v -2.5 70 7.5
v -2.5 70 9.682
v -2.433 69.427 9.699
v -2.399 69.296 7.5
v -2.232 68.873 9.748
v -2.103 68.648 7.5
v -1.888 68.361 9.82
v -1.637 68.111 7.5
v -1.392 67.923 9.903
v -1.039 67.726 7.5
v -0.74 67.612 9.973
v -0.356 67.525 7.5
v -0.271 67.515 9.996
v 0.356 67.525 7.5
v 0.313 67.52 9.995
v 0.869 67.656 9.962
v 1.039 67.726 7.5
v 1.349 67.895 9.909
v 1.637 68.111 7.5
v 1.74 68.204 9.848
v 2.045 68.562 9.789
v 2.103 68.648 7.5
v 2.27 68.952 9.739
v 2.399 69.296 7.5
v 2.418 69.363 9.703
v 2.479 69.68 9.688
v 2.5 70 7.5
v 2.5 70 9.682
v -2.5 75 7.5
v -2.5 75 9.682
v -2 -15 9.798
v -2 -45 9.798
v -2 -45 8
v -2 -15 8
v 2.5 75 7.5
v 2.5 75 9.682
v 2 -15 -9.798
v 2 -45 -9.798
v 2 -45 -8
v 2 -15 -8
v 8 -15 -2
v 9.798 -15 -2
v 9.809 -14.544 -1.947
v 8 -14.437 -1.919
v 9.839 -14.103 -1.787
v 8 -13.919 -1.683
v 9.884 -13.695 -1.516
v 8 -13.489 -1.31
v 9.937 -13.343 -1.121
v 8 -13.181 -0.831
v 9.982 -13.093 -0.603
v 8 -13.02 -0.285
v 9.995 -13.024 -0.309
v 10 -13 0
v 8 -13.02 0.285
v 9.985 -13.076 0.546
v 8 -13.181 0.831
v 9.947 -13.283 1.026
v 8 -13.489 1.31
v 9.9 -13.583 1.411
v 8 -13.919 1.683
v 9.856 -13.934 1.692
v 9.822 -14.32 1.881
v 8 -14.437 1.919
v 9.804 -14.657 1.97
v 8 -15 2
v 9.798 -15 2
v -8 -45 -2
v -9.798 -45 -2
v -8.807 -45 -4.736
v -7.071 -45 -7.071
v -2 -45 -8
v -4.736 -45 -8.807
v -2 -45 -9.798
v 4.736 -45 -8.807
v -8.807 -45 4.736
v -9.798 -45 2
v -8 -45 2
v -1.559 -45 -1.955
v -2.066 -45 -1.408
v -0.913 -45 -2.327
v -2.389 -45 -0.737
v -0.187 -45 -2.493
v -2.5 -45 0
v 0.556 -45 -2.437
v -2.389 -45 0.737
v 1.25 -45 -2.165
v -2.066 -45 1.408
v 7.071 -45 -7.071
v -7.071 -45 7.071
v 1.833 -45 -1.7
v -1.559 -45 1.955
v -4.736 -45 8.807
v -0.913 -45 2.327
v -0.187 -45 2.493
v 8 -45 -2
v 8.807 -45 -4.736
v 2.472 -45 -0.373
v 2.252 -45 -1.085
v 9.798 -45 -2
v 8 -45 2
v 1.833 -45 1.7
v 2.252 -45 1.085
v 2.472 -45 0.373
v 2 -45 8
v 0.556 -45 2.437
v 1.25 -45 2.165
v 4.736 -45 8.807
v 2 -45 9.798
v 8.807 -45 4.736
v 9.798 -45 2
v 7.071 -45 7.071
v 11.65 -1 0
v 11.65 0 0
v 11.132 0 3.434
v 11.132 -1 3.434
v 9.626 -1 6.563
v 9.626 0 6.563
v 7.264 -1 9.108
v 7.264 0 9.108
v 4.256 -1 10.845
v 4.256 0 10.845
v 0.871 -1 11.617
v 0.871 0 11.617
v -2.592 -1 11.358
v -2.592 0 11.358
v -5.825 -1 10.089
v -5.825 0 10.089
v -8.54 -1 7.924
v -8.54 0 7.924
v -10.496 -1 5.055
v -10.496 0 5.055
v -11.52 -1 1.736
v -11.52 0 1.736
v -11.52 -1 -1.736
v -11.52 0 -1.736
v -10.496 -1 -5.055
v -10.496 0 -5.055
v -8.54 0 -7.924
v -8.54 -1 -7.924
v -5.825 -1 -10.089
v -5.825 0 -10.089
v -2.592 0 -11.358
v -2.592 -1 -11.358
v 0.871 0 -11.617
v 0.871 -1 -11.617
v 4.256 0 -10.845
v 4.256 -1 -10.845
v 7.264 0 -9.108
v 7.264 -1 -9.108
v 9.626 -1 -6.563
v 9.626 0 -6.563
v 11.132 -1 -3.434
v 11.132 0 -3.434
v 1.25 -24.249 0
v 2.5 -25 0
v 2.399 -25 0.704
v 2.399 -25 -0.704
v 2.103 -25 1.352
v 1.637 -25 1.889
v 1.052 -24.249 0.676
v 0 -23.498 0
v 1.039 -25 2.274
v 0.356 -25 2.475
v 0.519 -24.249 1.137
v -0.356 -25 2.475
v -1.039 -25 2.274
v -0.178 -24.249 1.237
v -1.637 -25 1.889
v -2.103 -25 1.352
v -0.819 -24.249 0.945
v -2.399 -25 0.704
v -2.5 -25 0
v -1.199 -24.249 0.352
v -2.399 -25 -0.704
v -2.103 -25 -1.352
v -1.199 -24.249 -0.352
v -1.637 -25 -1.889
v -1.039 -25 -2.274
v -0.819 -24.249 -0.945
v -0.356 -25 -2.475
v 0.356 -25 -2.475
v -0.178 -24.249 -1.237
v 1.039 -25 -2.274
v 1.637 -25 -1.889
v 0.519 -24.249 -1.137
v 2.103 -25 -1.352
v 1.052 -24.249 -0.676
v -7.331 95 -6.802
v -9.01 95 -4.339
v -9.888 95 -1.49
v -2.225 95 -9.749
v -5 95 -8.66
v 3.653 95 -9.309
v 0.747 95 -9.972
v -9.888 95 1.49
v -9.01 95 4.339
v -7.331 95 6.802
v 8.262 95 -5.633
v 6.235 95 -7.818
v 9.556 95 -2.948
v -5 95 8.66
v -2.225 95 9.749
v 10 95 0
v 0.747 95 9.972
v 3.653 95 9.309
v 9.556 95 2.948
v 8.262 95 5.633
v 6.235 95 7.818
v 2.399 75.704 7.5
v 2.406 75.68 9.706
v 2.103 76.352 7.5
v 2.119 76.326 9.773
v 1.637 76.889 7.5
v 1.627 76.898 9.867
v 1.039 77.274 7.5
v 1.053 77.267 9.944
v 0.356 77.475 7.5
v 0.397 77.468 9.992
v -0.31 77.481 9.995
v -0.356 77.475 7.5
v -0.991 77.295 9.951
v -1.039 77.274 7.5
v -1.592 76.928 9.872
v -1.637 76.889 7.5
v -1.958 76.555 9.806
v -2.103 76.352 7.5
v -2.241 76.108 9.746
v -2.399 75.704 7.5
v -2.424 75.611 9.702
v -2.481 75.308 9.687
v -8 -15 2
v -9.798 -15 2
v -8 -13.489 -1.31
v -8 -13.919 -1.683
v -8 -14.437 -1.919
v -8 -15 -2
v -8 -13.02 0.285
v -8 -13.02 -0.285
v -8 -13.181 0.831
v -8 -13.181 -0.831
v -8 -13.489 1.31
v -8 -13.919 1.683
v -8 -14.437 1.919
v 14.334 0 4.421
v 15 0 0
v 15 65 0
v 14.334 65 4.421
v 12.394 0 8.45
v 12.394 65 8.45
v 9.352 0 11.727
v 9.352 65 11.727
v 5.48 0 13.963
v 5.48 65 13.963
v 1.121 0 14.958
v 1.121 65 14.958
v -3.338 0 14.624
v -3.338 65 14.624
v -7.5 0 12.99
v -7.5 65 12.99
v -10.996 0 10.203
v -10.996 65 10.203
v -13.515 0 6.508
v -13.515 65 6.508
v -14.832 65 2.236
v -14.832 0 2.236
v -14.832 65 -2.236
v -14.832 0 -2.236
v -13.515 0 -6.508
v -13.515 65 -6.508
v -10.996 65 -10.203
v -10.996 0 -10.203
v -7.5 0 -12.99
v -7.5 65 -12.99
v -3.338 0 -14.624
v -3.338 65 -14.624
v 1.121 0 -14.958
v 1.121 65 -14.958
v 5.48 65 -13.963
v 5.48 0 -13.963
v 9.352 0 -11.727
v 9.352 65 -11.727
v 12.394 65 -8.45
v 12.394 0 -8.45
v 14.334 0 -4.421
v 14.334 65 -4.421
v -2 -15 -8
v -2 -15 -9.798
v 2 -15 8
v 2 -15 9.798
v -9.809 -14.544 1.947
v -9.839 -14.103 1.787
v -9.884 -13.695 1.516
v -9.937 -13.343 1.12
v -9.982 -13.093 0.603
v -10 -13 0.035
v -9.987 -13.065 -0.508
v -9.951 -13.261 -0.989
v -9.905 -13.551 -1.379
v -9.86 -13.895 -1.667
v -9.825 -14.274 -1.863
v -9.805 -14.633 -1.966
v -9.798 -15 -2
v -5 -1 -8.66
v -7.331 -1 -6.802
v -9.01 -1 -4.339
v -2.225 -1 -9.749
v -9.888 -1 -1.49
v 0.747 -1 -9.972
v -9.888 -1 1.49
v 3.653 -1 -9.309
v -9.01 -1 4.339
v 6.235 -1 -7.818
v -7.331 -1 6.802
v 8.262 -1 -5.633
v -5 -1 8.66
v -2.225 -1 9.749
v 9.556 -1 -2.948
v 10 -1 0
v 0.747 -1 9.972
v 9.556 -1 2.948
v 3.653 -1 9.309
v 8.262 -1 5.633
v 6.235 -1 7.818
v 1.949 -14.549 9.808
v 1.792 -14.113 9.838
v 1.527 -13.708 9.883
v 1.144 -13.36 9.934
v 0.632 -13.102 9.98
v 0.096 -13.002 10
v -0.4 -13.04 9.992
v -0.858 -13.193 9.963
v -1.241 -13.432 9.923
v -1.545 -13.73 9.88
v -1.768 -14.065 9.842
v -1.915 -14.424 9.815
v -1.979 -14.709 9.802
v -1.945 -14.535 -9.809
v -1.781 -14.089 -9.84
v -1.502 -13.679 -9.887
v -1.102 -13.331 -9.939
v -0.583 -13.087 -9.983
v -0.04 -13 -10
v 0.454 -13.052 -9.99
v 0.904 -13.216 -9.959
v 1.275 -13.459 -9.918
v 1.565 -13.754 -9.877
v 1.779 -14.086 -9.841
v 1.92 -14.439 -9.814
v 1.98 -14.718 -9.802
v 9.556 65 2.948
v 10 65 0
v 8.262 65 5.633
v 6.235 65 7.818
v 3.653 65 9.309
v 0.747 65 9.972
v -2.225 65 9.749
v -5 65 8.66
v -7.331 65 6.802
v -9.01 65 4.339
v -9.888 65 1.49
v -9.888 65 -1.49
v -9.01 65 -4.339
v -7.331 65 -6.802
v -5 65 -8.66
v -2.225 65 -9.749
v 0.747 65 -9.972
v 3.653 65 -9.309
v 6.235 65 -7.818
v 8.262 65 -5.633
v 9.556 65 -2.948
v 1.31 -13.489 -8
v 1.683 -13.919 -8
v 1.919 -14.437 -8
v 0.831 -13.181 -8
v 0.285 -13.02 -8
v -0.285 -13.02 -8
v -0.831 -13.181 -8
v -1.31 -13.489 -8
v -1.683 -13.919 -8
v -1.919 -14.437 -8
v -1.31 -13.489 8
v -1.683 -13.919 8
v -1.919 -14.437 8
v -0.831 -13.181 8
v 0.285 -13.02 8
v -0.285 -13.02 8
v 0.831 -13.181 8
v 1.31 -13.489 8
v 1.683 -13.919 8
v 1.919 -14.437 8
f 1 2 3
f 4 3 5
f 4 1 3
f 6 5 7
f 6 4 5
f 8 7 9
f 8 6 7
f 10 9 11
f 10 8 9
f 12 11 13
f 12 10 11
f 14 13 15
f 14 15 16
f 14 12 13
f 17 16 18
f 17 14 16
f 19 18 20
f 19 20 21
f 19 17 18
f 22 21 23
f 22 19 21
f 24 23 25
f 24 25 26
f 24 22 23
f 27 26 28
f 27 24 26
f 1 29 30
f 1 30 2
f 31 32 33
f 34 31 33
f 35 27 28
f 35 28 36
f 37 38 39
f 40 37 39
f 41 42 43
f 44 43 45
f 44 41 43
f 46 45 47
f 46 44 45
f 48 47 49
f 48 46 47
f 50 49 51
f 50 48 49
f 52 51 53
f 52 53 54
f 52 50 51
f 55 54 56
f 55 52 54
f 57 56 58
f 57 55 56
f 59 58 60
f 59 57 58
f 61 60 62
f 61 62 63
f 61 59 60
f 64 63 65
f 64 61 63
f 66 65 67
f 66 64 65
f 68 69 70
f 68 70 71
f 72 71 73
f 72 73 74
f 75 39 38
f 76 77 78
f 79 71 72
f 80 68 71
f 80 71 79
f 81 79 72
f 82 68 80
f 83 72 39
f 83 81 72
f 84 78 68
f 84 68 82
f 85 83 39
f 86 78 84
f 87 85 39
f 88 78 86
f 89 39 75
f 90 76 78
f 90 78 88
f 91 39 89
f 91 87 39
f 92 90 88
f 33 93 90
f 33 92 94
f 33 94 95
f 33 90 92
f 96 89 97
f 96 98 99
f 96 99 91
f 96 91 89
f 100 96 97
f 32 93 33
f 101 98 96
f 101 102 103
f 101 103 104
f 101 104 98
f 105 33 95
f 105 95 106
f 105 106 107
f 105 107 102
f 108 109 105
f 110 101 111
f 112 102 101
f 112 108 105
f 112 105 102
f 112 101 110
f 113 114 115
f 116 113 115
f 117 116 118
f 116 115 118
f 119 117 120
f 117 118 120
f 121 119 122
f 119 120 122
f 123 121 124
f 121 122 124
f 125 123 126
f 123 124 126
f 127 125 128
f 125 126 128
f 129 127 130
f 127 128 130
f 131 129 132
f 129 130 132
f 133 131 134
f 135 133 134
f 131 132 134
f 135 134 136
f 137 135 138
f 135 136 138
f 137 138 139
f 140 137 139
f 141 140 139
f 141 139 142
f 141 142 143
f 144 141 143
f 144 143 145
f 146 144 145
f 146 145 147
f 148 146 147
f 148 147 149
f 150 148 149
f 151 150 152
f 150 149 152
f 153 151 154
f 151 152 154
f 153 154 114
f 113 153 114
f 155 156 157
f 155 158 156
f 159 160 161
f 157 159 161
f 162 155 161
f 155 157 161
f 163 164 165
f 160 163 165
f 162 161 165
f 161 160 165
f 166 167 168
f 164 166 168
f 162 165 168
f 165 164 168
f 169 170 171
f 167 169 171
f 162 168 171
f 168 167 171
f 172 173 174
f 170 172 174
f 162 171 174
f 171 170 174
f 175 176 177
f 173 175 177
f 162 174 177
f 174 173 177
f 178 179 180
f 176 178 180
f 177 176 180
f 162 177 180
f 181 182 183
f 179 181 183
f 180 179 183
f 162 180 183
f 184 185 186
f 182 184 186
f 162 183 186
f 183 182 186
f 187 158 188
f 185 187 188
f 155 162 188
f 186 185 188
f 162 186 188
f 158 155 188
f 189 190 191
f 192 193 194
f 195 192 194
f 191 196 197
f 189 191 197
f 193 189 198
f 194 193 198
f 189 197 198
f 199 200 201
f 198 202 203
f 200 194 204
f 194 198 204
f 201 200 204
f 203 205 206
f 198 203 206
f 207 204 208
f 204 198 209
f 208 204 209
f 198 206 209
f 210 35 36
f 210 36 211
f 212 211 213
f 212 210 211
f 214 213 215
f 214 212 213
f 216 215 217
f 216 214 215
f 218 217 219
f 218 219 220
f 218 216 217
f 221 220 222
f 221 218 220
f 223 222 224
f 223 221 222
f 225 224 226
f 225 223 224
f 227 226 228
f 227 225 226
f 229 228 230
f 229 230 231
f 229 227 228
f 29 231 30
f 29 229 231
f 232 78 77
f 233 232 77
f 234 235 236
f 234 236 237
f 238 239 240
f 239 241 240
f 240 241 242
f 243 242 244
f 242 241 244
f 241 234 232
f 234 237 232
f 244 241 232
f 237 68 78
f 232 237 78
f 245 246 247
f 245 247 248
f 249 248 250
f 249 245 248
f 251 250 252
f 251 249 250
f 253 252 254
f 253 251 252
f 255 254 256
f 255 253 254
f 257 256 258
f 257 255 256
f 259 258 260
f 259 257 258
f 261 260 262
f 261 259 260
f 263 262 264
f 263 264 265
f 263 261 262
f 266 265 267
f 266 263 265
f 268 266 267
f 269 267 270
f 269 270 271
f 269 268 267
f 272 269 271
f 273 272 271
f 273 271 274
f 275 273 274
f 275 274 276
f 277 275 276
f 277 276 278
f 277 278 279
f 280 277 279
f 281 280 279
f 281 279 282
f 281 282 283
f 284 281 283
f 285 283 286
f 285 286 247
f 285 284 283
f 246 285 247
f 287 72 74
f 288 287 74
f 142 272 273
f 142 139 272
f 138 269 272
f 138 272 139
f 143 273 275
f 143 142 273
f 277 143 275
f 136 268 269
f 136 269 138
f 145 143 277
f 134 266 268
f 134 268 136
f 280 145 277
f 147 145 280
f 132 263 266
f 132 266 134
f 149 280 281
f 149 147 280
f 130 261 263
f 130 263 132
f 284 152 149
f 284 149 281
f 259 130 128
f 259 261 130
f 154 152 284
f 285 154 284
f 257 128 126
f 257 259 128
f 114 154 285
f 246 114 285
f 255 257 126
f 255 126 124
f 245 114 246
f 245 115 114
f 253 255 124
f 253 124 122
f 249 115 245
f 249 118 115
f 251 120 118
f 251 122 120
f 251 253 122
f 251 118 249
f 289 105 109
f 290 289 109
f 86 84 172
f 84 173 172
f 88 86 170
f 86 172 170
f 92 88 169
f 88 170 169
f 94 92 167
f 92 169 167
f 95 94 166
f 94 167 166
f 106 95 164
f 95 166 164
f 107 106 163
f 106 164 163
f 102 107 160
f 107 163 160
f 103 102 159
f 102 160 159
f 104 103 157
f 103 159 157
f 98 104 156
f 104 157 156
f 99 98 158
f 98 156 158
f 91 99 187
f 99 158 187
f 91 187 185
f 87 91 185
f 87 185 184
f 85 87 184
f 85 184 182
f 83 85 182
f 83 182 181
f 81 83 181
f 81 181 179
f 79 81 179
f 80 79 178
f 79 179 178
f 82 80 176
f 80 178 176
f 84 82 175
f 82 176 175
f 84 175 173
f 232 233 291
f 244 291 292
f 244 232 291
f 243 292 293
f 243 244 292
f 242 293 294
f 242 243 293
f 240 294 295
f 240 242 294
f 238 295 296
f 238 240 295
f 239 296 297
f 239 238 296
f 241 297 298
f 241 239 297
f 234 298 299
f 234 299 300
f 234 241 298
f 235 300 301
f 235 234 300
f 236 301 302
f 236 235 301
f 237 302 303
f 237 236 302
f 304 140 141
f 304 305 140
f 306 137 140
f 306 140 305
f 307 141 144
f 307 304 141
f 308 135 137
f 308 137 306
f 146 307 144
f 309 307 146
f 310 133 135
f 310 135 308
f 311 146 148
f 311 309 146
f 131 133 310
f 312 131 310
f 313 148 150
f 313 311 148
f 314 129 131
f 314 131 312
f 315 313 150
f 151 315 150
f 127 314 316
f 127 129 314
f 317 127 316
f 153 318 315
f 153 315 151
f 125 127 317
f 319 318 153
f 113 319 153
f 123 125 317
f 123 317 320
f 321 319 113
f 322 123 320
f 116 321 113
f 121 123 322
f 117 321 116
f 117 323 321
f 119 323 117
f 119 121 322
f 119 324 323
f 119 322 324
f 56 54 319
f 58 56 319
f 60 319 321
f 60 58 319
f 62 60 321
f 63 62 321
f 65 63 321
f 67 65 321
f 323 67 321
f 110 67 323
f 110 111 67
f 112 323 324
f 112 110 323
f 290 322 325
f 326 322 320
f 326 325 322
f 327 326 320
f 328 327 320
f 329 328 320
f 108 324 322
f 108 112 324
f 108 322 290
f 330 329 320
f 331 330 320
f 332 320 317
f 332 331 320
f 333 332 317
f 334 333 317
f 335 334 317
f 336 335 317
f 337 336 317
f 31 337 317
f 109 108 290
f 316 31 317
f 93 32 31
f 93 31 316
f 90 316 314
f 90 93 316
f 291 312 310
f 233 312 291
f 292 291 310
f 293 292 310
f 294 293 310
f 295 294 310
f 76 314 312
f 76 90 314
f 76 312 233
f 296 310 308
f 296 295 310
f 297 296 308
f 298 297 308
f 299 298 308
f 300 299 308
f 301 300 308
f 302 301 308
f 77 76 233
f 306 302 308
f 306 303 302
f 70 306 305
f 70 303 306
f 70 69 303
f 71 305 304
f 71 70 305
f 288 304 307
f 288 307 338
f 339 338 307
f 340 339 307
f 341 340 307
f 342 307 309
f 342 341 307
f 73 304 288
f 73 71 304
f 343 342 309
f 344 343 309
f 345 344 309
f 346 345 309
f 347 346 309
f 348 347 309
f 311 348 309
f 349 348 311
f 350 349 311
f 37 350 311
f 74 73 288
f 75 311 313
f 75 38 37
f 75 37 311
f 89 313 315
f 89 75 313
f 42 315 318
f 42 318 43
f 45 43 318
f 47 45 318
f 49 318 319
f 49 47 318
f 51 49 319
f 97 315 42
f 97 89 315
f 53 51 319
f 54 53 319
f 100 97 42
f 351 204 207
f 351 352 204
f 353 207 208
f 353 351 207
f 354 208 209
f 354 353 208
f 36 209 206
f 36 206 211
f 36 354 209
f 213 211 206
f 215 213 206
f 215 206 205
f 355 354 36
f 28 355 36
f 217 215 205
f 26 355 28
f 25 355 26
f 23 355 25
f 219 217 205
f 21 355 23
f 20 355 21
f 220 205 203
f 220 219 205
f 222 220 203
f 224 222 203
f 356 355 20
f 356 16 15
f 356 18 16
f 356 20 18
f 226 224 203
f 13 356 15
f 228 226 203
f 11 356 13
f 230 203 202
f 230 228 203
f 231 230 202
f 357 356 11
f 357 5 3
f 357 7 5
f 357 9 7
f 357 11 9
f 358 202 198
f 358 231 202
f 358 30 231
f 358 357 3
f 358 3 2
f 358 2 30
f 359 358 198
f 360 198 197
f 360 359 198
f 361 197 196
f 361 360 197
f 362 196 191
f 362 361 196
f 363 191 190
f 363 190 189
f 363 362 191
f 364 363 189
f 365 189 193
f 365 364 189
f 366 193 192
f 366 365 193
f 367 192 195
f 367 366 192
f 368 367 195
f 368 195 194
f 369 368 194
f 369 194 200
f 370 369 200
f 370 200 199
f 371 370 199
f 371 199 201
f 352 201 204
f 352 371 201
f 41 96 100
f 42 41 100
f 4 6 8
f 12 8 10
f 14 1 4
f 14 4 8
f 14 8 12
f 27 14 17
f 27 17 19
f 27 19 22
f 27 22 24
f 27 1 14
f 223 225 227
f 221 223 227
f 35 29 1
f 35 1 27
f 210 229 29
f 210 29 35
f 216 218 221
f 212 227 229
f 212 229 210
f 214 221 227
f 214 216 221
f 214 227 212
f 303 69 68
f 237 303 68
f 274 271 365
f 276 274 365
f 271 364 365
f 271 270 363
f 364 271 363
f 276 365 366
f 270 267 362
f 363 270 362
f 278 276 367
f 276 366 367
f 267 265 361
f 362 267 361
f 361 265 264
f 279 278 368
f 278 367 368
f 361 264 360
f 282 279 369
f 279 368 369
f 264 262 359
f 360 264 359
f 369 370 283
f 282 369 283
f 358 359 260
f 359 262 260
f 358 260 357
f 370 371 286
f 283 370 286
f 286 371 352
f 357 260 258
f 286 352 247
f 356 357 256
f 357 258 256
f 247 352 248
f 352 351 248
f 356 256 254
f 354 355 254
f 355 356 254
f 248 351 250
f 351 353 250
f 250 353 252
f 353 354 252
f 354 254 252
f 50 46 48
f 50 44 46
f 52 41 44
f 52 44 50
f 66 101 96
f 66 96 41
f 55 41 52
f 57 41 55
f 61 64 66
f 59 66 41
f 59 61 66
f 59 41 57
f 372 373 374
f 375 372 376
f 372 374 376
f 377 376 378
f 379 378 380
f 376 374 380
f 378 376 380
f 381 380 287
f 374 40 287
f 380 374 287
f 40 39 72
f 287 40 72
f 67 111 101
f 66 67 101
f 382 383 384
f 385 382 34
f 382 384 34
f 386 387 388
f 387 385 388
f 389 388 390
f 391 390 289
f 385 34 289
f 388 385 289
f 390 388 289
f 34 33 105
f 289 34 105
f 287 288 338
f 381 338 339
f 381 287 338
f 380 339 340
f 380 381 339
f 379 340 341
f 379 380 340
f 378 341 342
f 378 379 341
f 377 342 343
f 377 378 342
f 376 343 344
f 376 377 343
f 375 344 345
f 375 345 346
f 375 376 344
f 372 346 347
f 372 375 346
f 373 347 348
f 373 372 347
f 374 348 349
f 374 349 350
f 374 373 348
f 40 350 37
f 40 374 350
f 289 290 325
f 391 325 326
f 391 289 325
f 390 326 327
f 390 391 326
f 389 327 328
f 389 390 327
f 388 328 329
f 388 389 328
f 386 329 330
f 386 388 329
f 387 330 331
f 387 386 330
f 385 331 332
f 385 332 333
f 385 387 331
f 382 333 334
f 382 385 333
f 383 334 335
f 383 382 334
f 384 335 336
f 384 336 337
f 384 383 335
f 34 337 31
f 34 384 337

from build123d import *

# Parameters (mm, degrees)
F0_R          = 10
F1_DEPTH      = 45
F1_DEPTH_BACK = 95
F0_R_2        = 15
F2_DEPTH      = 65
F4_START      = 7.5
F4_DEPTH      = 17.5
F6_DEPTH      = 30
F7_R          = 2
F8_DEPTH      = 25
F9_R          = 2
F10_DEPTH     = 25
F11_R         = 2
F12_DEPTH     = 25
F13_R         = 2
F14_DEPTH     = 25
F16_D         = 5
F16_DEPTH     = 20
F16_TIP       = 1.5021515476
F17_R         = 11.65
F18_DEPTH     = 1


with BuildPart() as f1:
    # F0 (on Front) → F1 (new body, two sides)
    with BuildSketch(Plane.XZ) as f1_sk:
        Circle(F0_R)
    extrude(amount=F1_DEPTH)
    extrude(f1_sk.sketch, amount=-F1_DEPTH_BACK)

    # F0 (on Front) → F2 (join)
    with BuildSketch(Plane.XZ):
        Circle(F0_R_2)
        Circle(F0_R, mode=Mode.SUBTRACT)
    extrude(amount=-F2_DEPTH)

    # F3 (on Top) → F4 (cut)
    with BuildSketch(Plane.XY.offset(F4_START)):
        with BuildLine():
            ThreePointArc((2.5, 75), (0, 77.5), (-2.5, 75))
            Line((-2.5, 75), (2.5, 75))
        make_face()
        with BuildLine():
            ThreePointArc((0, 72.5), (-1.767766953, 73.232233047), (-2.5, 75))
            Line((-2.5, 75), (-2.5, 70))
            ThreePointArc((-2.5, 70), (-1.767766953, 71.767766953), (0, 72.5))
        make_face()
        with BuildLine():
            Line((2.5, 75), (-2.5, 75))
            ThreePointArc((-2.5, 75), (-1.767766953, 73.232233047), (0, 72.5))
            ThreePointArc((0, 72.5), (1.767766953, 73.232233047), (2.5, 75))
        make_face()
        with BuildLine():
            Line((2.5, 70), (2.5, 75))
            ThreePointArc((2.5, 75), (1.767766953, 73.232233047), (0, 72.5))
            ThreePointArc((0, 72.5), (1.767766953, 71.767766953), (2.5, 70))
        make_face()
        with BuildLine():
            ThreePointArc((0, 72.5), (-1.767766953, 71.767766953), (-2.5, 70))
            Line((-2.5, 70), (2.5, 70))
            ThreePointArc((2.5, 70), (1.767766953, 71.767766953), (0, 72.5))
        make_face()
        with BuildLine():
            Line((2.5, 70), (-2.5, 70))
            ThreePointArc((-2.5, 70), (0, 67.5), (2.5, 70))
        make_face()
    extrude(amount=F4_DEPTH, mode=Mode.SUBTRACT)

    # F5 (on face) → F6 (cut)
    with BuildSketch(Plane.XZ.offset(45)):
        with BuildLine():
            Line((2, 8), (2, 9.7979589711))
            ThreePointArc((2, 9.7979589711), (0, 10), (-2, 9.7979589711))
            Line((-2, 9.7979589711), (-2, 8))
            Line((-2, 8), (2, 8))
        make_face()
        with BuildLine():
            ThreePointArc((9.7979589711, -2), (9.9493615301, -1.0050896201), (10, 0))
            ThreePointArc((10, 0), (9.9493615301, 1.0050896201), (9.7979589711, 2))
            Line((9.7979589711, 2), (8, 2))
            Line((8, 2), (8, -2))
            Line((8, -2), (9.7979589711, -2))
        make_face()
        with BuildLine():
            ThreePointArc((-2, -9.7979589711), (0, -10), (2, -9.7979589711))
            Line((2, -9.7979589711), (2, -8))
            Line((2, -8), (-2, -8))
            Line((-2, -8), (-2, -9.7979589711))
        make_face()
        with BuildLine():
            Line((-8, 2), (-9.7979589711, 2))
            ThreePointArc((-9.7979589711, 2), (-10, 0), (-9.7979589711, -2))
            Line((-9.7979589711, -2), (-8, -2))
            Line((-8, -2), (-8, 2))
        make_face()
    extrude(amount=-F6_DEPTH, mode=Mode.SUBTRACT)

    # F7 (on face) → F8 (cut)
    with BuildSketch(Plane.XY.offset(8)):
        with Locations((0, -15)):
            Circle(F7_R)
    extrude(amount=F8_DEPTH, mode=Mode.SUBTRACT)

    # F9 (on face) → F10 (cut)
    with BuildSketch(Plane.YZ.offset(8)):
        with Locations((-15, 0)):
            Circle(F9_R)
    extrude(amount=F10_DEPTH, mode=Mode.SUBTRACT)

    # F11 (on face) → F12 (cut)
    with BuildSketch(Plane(origin=(0, 0, -8), x_dir=(1, 0, 0), z_dir=(0, 0, -1))):
        with Locations((0, 15)):
            Circle(F11_R)
    extrude(amount=F12_DEPTH, mode=Mode.SUBTRACT)

    # F13 (on face) → F14 (cut)
    with BuildSketch(Plane(origin=(-8, 0, 0), x_dir=(0, -1, 0), z_dir=(-1, 0, 0))):
        with Locations((15, 0)):
            Circle(F13_R)
    extrude(amount=F14_DEPTH, mode=Mode.SUBTRACT)

    # F16
    with Locations(Plane.XZ.offset(45)):
        with Locations((0, 0)):
            Hole(F16_D / 2, depth=F16_DEPTH)
            with Locations((0, 0, -(F16_DEPTH + F16_TIP / 2))):  # 118° drill point
                Cone(0, F16_D / 2, F16_TIP, mode=Mode.SUBTRACT)

    # F17 (on face) → F18 (join)
    with BuildSketch(Plane.XZ):
        Circle(F17_R)
    extrude(amount=F18_DEPTH)


solid = f1.part
